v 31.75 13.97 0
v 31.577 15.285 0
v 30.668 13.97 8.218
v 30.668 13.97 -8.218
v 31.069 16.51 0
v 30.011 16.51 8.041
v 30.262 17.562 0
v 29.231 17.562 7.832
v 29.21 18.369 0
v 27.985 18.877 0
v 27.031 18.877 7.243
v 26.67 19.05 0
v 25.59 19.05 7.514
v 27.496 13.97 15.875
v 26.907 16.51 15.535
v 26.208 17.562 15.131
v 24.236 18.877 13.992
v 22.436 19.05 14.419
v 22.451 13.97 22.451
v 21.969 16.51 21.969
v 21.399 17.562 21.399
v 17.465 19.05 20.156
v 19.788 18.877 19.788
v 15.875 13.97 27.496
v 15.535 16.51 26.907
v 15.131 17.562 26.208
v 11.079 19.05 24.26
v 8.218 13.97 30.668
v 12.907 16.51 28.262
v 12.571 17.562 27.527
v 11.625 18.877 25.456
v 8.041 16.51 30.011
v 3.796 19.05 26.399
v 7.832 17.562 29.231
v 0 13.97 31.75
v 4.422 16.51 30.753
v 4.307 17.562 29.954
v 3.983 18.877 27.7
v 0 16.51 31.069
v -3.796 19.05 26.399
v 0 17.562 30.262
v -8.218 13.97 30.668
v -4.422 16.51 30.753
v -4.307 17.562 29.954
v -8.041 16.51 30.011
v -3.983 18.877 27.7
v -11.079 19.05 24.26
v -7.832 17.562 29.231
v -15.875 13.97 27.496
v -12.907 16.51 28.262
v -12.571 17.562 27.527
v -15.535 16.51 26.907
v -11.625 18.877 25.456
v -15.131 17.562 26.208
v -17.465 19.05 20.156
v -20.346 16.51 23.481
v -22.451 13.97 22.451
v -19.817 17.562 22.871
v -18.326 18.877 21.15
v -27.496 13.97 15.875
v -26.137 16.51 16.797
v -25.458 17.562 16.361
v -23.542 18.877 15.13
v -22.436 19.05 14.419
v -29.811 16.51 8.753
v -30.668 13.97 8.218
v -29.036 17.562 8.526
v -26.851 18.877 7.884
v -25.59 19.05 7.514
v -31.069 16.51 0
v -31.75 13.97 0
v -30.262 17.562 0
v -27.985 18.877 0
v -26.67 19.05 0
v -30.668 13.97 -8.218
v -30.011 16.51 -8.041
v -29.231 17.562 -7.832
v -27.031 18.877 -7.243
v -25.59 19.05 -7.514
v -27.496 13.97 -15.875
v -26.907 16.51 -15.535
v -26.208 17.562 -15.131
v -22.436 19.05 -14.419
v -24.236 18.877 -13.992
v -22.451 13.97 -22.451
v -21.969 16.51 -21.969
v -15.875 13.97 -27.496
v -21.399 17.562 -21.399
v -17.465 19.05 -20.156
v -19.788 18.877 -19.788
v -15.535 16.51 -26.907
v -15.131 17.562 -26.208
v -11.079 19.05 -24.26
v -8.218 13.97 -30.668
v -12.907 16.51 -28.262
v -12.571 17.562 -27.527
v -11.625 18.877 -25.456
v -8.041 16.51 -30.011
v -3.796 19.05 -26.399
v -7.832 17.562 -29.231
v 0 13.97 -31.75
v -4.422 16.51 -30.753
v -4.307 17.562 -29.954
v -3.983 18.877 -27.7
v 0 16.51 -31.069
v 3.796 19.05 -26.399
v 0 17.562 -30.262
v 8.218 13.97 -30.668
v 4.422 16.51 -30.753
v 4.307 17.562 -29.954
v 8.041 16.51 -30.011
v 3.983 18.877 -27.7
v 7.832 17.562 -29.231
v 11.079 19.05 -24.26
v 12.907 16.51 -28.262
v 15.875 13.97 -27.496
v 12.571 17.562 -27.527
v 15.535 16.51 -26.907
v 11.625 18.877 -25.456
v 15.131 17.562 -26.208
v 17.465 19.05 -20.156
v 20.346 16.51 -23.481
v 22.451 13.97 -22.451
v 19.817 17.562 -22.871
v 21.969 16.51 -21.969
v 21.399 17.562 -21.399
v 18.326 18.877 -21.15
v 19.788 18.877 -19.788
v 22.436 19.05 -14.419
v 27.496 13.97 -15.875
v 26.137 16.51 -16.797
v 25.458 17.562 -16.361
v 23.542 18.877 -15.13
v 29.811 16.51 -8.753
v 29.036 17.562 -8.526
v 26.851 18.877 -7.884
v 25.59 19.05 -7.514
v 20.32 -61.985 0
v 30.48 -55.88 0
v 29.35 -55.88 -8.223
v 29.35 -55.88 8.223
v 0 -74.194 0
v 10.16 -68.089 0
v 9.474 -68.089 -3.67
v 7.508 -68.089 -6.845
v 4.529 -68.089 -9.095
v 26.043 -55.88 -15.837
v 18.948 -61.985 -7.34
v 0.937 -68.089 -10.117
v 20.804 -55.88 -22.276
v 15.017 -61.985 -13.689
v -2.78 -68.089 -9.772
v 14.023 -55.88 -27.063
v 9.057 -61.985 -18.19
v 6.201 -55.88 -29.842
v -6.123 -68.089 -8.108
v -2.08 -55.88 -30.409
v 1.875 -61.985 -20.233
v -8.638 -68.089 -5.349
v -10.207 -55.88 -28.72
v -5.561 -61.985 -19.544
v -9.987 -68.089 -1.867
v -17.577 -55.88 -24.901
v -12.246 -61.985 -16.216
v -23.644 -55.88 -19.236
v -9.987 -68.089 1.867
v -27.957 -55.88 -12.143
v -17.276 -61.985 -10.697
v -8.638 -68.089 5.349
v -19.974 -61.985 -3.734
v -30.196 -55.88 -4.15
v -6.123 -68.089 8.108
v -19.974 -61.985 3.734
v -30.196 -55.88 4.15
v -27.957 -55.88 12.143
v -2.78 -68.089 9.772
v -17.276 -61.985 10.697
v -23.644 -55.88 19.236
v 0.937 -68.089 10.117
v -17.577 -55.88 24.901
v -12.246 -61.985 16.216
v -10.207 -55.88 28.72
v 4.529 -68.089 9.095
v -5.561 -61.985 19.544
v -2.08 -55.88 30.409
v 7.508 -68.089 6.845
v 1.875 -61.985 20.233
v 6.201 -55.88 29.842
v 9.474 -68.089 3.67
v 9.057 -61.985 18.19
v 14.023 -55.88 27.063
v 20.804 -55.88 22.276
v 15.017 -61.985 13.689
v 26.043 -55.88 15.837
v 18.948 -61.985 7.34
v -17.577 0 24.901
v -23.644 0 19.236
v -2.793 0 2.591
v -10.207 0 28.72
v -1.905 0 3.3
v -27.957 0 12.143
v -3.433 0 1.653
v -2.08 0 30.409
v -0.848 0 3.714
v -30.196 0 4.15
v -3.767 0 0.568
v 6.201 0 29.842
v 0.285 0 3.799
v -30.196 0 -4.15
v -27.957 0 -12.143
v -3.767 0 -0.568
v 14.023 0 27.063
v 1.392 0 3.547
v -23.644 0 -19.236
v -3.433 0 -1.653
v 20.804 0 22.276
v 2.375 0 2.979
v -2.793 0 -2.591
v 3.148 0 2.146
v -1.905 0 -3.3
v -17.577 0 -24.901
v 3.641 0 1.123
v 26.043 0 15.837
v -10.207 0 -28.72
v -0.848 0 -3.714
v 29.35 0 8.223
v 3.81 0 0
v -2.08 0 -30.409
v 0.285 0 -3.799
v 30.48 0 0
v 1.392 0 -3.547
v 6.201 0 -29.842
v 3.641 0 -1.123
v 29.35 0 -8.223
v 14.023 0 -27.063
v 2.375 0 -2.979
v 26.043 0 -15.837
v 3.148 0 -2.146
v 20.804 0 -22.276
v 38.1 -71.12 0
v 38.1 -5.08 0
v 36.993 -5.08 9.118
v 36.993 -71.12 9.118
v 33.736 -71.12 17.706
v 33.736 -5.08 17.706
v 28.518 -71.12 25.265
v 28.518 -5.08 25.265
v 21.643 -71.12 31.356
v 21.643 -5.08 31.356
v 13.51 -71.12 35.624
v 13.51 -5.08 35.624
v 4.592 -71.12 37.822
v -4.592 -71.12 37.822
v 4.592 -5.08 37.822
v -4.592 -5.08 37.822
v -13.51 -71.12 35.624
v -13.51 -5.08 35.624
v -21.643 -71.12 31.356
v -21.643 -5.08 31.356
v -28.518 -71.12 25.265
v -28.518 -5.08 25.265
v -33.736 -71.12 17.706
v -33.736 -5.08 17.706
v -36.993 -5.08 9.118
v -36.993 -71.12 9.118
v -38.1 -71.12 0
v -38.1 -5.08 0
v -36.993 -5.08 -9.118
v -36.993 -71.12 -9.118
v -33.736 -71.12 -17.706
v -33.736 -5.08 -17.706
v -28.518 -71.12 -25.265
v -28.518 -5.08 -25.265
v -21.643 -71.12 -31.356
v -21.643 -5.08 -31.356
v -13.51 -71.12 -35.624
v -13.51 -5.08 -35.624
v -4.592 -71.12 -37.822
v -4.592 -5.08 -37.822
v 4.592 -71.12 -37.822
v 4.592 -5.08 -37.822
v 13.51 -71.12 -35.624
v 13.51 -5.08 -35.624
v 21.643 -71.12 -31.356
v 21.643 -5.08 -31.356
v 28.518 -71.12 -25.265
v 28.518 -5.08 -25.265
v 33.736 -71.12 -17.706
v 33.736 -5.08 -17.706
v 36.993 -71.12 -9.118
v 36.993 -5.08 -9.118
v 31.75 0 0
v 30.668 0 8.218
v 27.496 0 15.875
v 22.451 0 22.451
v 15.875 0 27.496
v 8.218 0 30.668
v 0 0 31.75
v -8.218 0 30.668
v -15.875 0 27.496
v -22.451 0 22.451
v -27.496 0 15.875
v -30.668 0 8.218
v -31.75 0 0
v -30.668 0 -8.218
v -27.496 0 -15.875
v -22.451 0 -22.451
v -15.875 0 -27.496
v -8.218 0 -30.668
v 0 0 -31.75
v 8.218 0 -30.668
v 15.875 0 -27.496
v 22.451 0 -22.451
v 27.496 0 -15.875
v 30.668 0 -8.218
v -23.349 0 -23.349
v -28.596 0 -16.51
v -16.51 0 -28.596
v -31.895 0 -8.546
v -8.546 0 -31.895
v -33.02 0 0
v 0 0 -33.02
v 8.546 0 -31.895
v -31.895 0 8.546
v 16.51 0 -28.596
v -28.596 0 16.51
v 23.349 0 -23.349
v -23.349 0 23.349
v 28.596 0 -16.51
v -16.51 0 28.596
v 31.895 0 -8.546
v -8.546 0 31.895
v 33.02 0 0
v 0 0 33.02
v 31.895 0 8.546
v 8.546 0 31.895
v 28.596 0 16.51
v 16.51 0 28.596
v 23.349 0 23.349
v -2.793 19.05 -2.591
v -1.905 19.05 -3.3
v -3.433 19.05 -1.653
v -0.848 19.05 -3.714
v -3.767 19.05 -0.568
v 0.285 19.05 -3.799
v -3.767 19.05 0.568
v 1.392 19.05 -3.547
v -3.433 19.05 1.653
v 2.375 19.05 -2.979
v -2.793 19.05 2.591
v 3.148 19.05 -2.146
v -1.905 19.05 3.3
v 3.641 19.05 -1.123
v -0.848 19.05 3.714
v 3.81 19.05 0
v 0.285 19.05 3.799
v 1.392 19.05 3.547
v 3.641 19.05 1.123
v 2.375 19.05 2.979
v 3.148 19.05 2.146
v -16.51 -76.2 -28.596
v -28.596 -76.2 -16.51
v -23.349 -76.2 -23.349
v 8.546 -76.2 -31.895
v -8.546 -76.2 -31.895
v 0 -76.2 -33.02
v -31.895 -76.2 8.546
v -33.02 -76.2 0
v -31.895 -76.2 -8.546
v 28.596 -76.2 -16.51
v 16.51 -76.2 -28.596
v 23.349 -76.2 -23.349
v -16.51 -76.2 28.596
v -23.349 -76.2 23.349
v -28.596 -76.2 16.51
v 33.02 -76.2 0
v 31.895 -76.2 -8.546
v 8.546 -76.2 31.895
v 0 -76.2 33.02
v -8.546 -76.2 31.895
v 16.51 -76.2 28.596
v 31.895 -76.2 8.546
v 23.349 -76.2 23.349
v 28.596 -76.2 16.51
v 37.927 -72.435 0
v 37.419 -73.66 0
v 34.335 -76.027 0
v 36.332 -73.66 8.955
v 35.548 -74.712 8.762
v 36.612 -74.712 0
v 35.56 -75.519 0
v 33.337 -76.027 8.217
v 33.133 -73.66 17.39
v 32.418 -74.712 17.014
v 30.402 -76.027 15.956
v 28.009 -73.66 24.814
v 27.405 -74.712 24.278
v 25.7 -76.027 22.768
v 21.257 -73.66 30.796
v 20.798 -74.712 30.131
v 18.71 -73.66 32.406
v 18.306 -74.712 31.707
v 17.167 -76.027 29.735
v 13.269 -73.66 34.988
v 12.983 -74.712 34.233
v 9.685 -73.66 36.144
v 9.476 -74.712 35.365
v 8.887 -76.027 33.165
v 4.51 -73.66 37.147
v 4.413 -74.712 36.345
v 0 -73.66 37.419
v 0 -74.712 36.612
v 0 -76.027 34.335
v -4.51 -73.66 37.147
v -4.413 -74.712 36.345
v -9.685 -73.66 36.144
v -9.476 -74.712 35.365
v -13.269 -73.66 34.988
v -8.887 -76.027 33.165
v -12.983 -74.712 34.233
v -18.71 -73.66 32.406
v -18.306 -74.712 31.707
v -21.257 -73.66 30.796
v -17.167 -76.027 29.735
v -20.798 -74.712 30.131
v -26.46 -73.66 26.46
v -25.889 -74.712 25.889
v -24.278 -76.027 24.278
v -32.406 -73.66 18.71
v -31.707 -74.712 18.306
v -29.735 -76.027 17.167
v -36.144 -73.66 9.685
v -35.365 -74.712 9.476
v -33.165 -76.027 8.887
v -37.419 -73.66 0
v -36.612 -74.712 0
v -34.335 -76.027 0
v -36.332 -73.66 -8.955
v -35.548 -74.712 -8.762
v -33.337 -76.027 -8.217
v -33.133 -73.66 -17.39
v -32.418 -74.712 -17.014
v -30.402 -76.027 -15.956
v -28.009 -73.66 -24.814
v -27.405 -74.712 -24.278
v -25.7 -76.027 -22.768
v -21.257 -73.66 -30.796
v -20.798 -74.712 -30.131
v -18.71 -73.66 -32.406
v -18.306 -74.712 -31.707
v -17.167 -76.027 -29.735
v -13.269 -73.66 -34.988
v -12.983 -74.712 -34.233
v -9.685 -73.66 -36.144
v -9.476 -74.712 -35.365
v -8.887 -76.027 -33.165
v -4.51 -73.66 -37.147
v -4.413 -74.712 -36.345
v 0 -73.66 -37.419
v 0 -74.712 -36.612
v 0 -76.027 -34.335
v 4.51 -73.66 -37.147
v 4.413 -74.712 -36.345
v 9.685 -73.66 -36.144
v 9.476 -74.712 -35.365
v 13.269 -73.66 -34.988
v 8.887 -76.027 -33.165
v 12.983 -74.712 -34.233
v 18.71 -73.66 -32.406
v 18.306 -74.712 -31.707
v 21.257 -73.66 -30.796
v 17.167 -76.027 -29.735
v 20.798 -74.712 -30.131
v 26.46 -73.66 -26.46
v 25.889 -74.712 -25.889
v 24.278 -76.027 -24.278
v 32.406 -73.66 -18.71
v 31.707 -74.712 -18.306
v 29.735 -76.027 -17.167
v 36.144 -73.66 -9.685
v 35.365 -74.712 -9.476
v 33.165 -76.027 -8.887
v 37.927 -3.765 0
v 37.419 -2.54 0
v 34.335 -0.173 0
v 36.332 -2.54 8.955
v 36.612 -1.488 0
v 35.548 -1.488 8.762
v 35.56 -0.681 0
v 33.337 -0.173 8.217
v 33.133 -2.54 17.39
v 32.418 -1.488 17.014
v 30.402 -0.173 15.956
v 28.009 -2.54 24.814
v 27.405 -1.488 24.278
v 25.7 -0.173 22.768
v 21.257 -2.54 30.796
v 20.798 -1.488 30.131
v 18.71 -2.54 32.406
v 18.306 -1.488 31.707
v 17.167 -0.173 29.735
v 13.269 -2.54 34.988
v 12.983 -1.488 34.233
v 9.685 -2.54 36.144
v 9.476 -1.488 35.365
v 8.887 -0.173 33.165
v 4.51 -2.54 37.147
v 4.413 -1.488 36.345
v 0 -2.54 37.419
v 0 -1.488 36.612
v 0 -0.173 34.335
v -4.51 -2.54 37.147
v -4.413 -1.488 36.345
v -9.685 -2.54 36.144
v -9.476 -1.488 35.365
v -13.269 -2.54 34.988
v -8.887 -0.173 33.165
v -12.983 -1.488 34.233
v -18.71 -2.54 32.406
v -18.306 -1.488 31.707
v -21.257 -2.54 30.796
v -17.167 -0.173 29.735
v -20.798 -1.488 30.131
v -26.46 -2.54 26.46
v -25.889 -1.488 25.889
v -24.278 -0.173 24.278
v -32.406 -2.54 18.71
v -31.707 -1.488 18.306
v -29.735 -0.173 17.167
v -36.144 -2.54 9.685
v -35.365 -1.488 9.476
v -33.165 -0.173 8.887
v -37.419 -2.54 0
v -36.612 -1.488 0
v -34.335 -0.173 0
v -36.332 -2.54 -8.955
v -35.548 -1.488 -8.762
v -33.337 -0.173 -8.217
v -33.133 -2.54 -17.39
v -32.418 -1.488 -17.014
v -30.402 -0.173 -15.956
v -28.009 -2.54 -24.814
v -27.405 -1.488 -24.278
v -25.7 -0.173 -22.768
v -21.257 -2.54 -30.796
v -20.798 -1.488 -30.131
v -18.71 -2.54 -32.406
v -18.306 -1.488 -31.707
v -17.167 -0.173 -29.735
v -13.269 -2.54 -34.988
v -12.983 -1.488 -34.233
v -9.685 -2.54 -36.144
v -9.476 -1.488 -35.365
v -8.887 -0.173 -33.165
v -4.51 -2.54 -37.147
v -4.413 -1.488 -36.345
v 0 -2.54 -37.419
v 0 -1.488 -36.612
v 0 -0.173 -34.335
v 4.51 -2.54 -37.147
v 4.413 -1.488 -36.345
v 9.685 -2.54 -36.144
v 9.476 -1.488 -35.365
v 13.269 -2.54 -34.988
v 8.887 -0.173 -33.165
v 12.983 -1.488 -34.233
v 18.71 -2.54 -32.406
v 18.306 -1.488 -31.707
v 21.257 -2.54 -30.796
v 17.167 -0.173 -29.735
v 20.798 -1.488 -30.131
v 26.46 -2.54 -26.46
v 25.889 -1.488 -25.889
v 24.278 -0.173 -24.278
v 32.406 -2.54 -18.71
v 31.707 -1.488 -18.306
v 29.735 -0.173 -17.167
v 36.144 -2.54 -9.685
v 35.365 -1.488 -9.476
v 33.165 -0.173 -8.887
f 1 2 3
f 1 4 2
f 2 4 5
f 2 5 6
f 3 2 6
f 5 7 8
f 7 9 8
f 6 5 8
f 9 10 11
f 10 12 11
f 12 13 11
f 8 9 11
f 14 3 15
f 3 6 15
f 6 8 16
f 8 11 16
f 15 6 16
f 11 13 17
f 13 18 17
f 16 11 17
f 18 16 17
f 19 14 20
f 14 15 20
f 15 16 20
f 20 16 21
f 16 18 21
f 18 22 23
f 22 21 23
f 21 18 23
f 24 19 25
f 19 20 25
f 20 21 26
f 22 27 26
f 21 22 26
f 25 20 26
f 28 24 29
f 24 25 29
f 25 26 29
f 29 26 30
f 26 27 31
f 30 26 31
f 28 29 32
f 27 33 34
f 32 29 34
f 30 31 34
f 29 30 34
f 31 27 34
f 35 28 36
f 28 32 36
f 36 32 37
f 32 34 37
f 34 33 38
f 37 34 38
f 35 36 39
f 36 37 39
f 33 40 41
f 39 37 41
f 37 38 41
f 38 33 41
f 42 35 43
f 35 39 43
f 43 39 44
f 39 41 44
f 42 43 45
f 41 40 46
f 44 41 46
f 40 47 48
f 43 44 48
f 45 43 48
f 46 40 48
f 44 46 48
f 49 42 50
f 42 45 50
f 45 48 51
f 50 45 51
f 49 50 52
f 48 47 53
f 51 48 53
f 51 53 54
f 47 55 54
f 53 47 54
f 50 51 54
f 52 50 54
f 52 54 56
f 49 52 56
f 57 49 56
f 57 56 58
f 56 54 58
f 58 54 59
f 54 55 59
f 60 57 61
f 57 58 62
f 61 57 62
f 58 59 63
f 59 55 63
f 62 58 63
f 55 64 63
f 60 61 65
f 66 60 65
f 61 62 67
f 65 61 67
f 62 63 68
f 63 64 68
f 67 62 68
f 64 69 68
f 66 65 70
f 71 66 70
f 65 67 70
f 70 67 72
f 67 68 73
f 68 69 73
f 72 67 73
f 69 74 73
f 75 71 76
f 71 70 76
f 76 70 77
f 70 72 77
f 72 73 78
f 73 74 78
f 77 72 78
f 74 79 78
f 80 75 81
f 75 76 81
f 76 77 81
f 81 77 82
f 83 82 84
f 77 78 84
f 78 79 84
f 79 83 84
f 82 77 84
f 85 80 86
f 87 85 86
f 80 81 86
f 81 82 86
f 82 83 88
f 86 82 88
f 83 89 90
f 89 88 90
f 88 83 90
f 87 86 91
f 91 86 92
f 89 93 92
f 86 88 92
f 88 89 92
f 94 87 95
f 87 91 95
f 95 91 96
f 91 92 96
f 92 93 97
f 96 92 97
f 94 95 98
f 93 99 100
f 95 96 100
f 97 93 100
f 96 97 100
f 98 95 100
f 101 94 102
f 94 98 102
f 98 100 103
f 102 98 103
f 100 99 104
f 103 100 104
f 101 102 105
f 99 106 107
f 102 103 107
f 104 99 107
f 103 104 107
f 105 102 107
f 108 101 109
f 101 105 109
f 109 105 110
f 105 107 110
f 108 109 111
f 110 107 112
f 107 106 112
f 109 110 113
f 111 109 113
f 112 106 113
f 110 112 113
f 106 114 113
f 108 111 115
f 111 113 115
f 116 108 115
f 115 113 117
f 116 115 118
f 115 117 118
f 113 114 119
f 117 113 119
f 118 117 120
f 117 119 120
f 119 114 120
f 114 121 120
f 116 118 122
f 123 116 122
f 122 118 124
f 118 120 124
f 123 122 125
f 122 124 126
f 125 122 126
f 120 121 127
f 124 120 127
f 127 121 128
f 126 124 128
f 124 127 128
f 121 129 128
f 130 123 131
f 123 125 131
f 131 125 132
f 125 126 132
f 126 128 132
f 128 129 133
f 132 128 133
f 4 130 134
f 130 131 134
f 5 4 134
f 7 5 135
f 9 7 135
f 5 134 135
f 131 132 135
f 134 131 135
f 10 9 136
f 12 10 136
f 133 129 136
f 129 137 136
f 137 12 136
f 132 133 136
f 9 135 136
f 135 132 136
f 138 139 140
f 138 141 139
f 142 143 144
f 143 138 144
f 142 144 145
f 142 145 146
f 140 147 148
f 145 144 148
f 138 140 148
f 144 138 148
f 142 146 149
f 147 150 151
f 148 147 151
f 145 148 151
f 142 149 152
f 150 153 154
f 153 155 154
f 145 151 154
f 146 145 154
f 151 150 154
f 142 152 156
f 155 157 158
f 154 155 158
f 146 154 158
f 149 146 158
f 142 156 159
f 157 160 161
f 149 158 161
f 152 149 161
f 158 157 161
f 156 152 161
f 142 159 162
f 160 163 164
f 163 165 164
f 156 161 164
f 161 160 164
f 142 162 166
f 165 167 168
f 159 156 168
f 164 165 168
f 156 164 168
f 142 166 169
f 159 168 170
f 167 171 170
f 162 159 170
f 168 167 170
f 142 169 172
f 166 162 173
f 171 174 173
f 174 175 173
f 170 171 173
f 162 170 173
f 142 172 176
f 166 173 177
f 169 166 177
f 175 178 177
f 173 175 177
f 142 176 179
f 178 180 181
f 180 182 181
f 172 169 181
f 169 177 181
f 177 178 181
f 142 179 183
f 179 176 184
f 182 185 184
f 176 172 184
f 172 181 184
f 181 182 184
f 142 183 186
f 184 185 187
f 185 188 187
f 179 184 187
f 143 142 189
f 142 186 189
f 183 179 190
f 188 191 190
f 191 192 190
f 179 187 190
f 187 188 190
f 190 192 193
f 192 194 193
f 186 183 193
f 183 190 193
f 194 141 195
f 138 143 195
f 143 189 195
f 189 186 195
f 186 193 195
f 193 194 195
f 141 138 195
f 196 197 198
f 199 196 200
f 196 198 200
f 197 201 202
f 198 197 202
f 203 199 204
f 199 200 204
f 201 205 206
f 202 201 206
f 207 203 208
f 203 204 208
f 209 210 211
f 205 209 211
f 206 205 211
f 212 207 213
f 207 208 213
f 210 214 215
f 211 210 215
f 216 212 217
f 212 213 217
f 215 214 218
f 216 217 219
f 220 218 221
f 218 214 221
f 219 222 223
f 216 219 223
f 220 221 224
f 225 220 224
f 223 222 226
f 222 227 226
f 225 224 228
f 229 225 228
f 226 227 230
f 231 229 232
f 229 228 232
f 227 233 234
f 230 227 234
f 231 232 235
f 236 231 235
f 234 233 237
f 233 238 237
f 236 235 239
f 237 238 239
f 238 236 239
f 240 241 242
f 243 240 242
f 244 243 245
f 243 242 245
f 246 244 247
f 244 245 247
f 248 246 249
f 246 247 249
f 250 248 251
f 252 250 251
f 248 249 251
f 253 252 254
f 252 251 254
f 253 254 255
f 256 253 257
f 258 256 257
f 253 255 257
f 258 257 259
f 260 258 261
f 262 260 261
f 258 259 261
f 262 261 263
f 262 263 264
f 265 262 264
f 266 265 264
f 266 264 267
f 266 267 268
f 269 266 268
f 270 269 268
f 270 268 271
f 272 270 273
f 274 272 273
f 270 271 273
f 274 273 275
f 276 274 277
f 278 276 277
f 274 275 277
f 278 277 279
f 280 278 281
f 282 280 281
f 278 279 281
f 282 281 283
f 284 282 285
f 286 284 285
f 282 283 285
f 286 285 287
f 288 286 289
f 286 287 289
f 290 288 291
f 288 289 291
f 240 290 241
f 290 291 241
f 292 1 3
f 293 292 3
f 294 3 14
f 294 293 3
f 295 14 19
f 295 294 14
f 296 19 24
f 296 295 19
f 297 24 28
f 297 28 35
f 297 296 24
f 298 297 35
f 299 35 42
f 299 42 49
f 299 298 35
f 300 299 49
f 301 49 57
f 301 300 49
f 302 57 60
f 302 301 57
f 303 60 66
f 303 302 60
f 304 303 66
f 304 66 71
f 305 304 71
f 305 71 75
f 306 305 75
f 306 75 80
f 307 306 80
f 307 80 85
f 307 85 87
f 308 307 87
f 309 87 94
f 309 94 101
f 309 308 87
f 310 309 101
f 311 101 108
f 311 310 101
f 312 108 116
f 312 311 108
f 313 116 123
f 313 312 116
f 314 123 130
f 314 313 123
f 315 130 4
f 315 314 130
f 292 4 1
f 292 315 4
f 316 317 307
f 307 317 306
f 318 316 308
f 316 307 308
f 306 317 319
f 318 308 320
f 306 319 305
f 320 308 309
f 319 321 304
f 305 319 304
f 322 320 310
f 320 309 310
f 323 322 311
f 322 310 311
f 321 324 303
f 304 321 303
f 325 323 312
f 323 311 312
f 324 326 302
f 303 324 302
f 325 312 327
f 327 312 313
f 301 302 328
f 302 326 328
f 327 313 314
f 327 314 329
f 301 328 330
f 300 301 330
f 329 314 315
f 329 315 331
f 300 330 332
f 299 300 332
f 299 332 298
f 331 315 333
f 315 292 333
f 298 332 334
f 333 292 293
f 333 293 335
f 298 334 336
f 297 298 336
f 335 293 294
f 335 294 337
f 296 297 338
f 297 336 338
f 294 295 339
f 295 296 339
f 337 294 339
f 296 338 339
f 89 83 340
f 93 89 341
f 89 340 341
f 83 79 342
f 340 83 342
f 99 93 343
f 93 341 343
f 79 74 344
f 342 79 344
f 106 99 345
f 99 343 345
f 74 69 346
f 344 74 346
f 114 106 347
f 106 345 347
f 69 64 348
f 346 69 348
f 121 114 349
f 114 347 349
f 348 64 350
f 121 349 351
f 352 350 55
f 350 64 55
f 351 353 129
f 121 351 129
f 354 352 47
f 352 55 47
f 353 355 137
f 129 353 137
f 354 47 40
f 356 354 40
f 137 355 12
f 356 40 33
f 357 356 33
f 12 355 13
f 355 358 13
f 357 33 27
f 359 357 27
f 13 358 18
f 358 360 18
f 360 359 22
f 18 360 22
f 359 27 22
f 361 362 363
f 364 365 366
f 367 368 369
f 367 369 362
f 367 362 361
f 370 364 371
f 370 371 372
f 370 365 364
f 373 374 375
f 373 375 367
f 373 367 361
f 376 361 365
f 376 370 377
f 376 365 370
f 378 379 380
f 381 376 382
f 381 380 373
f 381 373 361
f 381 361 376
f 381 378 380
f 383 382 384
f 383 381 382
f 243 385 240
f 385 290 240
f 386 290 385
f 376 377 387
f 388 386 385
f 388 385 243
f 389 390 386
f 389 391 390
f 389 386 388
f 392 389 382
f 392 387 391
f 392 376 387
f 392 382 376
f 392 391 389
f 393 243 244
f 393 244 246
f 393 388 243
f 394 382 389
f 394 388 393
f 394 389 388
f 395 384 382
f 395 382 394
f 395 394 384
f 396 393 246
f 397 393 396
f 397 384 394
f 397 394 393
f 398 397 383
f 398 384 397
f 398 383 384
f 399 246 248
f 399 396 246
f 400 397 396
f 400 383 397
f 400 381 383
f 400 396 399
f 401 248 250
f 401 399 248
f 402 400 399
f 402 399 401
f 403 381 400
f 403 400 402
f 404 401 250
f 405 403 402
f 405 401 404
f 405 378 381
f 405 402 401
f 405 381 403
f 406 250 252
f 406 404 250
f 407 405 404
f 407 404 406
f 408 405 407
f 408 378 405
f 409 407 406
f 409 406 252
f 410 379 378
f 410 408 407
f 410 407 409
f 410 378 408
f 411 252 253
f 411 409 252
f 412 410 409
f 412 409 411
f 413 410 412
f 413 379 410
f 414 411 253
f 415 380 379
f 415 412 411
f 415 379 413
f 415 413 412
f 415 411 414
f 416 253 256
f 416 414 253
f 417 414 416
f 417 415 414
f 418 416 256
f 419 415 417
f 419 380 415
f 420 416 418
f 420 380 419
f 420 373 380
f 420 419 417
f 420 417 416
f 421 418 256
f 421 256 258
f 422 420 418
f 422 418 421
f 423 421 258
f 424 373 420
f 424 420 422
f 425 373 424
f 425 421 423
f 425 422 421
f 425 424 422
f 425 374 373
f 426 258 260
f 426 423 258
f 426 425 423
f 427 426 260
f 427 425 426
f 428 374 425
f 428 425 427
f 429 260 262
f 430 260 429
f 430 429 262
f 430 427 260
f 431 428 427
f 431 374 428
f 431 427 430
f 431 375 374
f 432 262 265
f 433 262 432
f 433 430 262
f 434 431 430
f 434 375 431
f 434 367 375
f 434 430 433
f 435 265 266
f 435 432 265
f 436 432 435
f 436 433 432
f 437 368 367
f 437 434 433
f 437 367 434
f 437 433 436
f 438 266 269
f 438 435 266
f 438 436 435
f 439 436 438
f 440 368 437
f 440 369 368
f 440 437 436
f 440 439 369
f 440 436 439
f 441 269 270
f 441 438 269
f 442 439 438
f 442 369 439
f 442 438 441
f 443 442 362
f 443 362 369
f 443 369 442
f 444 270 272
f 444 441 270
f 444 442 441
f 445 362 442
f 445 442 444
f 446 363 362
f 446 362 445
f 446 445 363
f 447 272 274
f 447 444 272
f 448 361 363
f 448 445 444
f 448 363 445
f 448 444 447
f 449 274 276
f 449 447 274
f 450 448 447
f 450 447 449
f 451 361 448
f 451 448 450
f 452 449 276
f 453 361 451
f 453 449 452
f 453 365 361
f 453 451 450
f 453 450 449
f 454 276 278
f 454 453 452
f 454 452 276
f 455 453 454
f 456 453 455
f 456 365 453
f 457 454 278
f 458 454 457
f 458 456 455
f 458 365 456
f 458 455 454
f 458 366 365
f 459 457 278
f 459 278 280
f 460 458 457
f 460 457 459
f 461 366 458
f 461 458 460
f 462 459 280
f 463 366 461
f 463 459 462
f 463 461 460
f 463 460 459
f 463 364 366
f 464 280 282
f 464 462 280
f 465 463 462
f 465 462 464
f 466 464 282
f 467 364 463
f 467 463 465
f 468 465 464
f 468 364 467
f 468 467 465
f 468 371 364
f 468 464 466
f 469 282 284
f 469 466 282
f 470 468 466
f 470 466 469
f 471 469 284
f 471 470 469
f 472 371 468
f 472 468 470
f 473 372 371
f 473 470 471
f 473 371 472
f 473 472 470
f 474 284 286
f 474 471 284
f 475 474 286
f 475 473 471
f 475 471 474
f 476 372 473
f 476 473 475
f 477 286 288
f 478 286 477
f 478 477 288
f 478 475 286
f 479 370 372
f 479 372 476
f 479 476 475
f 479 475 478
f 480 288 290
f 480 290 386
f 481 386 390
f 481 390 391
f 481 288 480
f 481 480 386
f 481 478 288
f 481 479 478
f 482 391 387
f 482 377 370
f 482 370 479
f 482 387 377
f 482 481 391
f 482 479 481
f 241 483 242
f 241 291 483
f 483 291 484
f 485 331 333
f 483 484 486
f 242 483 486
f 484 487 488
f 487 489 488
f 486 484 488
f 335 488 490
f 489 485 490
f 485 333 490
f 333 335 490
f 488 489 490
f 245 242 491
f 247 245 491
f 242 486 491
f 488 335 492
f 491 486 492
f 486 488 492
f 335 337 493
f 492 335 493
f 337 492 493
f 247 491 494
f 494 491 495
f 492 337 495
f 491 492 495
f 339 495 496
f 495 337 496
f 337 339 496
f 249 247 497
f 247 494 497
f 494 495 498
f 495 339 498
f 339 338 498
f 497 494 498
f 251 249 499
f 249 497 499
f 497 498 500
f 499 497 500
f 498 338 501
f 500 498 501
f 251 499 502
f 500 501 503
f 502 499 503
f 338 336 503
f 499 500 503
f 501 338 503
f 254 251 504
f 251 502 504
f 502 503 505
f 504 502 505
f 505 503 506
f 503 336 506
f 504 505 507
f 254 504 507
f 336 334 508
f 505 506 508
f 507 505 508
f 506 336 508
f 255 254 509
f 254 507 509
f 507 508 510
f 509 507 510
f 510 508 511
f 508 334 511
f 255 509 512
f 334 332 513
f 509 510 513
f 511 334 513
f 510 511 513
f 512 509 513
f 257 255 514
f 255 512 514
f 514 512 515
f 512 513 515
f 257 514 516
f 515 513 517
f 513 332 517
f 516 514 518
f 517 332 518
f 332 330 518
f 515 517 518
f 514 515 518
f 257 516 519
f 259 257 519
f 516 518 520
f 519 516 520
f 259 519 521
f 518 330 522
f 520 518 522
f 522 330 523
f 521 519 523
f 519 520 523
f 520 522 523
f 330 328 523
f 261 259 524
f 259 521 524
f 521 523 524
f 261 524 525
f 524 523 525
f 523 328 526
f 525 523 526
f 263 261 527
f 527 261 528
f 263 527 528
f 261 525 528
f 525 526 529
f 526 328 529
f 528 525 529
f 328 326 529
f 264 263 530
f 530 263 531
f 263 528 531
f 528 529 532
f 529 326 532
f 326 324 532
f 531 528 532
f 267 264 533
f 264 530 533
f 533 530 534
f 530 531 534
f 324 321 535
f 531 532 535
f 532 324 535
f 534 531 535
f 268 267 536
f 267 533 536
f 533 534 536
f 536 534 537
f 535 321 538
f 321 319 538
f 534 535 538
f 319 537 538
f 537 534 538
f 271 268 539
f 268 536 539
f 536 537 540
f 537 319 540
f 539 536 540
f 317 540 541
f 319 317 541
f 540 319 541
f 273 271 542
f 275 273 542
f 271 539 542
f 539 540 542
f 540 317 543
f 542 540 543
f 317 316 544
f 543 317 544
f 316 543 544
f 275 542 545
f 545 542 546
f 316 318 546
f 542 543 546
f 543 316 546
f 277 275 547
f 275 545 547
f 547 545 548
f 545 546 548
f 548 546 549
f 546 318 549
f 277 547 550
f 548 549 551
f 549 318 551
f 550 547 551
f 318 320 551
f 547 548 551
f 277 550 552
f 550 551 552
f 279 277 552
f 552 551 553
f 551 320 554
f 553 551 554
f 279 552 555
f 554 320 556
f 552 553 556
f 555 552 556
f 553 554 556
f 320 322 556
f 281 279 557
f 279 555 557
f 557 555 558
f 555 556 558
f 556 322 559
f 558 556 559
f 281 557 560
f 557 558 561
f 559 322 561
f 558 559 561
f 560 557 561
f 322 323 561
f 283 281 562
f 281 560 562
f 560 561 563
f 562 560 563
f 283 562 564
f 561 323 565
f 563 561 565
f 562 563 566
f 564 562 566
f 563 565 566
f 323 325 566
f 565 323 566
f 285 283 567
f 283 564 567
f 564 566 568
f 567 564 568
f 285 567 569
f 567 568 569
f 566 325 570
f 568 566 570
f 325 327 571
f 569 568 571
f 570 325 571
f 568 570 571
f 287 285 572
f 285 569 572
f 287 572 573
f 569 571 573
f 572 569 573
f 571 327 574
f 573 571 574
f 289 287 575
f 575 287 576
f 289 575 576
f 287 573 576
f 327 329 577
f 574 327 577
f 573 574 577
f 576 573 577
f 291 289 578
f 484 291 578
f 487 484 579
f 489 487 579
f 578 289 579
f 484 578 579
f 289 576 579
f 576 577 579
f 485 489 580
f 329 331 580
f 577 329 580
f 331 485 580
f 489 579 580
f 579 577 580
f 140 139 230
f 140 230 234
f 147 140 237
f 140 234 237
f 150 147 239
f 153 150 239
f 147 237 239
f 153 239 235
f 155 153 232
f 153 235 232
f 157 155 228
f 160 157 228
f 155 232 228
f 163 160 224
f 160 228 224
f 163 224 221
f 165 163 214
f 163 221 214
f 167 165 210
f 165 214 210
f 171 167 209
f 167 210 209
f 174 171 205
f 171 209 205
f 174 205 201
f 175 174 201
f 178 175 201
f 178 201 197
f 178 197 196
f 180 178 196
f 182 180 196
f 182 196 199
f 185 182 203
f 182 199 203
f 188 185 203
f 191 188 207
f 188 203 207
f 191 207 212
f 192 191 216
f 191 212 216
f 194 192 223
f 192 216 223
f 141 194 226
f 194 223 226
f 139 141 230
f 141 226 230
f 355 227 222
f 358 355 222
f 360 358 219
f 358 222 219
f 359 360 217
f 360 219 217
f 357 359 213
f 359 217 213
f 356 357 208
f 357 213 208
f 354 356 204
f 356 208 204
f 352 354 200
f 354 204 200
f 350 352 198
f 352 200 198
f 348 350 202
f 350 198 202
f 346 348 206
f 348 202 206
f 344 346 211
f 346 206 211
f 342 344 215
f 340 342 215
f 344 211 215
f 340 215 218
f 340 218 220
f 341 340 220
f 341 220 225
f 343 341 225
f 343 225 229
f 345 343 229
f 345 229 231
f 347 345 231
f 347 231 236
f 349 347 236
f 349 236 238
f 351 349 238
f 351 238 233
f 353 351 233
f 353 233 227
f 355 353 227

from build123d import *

# Parameters (mm, degrees)
F0_R     = 38.1
F1_DEPTH = 76.2
F2_R     = 31.75
F3_DEPTH = 19.05
F4_R     = 5.08
F6_D     = 7.62
F6_DEPTH = 21.59
F6_TIP   = 2.2892789585
F7_D     = 60.96
F7_DEPTH = 55.88
F7_TIP   = 18.314231668


with BuildPart() as f1:
    # F0 (on Front) → F1 (new body)
    with BuildSketch(Plane.XZ):
        Circle(F0_R)
    extrude(amount=F1_DEPTH)

    # F2 (on Front) → F3 (join)
    with BuildSketch(Plane.XZ):
        Circle(F2_R)
    extrude(amount=-F3_DEPTH)

    # F4
    f4_edges = [f1.edges().sort_by_distance(p)[0] for p in [
        (-31.75, 19.05, 0),
        (38.1, -38.1, 0),
        (-38.1, 0, 0),
        (-38.1, -76.2, 0),
    ]]
    fillet(f4_edges, radius=F4_R)

    # F6 (one way)
    with BuildSketch(Plane.XZ):
        with Locations((0, 0)):
            Circle(F6_D / 2)
    extrude(amount=-F6_DEPTH, mode=Mode.SUBTRACT)
    with Locations(Plane.XZ):
        with Locations((0, 0)):
            with Locations((0, 0, -(F6_DEPTH + F6_TIP / 2))):  # 118° drill point
                Cone(0, F6_D / 2, F6_TIP, mode=Mode.SUBTRACT)

    # F7 (one way)
    with BuildSketch(Plane(origin=(0, 0, 0), x_dir=(1, 0, 0), z_dir=(0, 1, 0))):
        with Locations((0, 0)):
            Circle(F7_D / 2)
    extrude(amount=-F7_DEPTH, mode=Mode.SUBTRACT)
    with Locations(Plane(origin=(0, 0, 0), x_dir=(1, 0, 0), z_dir=(0, 1, 0))):
        with Locations((0, 0)):
            with Locations((0, 0, -(F7_DEPTH + F7_TIP / 2))):  # 118° drill point
                Cone(0, F7_D / 2, F7_TIP, mode=Mode.SUBTRACT)


solid = f1.part
